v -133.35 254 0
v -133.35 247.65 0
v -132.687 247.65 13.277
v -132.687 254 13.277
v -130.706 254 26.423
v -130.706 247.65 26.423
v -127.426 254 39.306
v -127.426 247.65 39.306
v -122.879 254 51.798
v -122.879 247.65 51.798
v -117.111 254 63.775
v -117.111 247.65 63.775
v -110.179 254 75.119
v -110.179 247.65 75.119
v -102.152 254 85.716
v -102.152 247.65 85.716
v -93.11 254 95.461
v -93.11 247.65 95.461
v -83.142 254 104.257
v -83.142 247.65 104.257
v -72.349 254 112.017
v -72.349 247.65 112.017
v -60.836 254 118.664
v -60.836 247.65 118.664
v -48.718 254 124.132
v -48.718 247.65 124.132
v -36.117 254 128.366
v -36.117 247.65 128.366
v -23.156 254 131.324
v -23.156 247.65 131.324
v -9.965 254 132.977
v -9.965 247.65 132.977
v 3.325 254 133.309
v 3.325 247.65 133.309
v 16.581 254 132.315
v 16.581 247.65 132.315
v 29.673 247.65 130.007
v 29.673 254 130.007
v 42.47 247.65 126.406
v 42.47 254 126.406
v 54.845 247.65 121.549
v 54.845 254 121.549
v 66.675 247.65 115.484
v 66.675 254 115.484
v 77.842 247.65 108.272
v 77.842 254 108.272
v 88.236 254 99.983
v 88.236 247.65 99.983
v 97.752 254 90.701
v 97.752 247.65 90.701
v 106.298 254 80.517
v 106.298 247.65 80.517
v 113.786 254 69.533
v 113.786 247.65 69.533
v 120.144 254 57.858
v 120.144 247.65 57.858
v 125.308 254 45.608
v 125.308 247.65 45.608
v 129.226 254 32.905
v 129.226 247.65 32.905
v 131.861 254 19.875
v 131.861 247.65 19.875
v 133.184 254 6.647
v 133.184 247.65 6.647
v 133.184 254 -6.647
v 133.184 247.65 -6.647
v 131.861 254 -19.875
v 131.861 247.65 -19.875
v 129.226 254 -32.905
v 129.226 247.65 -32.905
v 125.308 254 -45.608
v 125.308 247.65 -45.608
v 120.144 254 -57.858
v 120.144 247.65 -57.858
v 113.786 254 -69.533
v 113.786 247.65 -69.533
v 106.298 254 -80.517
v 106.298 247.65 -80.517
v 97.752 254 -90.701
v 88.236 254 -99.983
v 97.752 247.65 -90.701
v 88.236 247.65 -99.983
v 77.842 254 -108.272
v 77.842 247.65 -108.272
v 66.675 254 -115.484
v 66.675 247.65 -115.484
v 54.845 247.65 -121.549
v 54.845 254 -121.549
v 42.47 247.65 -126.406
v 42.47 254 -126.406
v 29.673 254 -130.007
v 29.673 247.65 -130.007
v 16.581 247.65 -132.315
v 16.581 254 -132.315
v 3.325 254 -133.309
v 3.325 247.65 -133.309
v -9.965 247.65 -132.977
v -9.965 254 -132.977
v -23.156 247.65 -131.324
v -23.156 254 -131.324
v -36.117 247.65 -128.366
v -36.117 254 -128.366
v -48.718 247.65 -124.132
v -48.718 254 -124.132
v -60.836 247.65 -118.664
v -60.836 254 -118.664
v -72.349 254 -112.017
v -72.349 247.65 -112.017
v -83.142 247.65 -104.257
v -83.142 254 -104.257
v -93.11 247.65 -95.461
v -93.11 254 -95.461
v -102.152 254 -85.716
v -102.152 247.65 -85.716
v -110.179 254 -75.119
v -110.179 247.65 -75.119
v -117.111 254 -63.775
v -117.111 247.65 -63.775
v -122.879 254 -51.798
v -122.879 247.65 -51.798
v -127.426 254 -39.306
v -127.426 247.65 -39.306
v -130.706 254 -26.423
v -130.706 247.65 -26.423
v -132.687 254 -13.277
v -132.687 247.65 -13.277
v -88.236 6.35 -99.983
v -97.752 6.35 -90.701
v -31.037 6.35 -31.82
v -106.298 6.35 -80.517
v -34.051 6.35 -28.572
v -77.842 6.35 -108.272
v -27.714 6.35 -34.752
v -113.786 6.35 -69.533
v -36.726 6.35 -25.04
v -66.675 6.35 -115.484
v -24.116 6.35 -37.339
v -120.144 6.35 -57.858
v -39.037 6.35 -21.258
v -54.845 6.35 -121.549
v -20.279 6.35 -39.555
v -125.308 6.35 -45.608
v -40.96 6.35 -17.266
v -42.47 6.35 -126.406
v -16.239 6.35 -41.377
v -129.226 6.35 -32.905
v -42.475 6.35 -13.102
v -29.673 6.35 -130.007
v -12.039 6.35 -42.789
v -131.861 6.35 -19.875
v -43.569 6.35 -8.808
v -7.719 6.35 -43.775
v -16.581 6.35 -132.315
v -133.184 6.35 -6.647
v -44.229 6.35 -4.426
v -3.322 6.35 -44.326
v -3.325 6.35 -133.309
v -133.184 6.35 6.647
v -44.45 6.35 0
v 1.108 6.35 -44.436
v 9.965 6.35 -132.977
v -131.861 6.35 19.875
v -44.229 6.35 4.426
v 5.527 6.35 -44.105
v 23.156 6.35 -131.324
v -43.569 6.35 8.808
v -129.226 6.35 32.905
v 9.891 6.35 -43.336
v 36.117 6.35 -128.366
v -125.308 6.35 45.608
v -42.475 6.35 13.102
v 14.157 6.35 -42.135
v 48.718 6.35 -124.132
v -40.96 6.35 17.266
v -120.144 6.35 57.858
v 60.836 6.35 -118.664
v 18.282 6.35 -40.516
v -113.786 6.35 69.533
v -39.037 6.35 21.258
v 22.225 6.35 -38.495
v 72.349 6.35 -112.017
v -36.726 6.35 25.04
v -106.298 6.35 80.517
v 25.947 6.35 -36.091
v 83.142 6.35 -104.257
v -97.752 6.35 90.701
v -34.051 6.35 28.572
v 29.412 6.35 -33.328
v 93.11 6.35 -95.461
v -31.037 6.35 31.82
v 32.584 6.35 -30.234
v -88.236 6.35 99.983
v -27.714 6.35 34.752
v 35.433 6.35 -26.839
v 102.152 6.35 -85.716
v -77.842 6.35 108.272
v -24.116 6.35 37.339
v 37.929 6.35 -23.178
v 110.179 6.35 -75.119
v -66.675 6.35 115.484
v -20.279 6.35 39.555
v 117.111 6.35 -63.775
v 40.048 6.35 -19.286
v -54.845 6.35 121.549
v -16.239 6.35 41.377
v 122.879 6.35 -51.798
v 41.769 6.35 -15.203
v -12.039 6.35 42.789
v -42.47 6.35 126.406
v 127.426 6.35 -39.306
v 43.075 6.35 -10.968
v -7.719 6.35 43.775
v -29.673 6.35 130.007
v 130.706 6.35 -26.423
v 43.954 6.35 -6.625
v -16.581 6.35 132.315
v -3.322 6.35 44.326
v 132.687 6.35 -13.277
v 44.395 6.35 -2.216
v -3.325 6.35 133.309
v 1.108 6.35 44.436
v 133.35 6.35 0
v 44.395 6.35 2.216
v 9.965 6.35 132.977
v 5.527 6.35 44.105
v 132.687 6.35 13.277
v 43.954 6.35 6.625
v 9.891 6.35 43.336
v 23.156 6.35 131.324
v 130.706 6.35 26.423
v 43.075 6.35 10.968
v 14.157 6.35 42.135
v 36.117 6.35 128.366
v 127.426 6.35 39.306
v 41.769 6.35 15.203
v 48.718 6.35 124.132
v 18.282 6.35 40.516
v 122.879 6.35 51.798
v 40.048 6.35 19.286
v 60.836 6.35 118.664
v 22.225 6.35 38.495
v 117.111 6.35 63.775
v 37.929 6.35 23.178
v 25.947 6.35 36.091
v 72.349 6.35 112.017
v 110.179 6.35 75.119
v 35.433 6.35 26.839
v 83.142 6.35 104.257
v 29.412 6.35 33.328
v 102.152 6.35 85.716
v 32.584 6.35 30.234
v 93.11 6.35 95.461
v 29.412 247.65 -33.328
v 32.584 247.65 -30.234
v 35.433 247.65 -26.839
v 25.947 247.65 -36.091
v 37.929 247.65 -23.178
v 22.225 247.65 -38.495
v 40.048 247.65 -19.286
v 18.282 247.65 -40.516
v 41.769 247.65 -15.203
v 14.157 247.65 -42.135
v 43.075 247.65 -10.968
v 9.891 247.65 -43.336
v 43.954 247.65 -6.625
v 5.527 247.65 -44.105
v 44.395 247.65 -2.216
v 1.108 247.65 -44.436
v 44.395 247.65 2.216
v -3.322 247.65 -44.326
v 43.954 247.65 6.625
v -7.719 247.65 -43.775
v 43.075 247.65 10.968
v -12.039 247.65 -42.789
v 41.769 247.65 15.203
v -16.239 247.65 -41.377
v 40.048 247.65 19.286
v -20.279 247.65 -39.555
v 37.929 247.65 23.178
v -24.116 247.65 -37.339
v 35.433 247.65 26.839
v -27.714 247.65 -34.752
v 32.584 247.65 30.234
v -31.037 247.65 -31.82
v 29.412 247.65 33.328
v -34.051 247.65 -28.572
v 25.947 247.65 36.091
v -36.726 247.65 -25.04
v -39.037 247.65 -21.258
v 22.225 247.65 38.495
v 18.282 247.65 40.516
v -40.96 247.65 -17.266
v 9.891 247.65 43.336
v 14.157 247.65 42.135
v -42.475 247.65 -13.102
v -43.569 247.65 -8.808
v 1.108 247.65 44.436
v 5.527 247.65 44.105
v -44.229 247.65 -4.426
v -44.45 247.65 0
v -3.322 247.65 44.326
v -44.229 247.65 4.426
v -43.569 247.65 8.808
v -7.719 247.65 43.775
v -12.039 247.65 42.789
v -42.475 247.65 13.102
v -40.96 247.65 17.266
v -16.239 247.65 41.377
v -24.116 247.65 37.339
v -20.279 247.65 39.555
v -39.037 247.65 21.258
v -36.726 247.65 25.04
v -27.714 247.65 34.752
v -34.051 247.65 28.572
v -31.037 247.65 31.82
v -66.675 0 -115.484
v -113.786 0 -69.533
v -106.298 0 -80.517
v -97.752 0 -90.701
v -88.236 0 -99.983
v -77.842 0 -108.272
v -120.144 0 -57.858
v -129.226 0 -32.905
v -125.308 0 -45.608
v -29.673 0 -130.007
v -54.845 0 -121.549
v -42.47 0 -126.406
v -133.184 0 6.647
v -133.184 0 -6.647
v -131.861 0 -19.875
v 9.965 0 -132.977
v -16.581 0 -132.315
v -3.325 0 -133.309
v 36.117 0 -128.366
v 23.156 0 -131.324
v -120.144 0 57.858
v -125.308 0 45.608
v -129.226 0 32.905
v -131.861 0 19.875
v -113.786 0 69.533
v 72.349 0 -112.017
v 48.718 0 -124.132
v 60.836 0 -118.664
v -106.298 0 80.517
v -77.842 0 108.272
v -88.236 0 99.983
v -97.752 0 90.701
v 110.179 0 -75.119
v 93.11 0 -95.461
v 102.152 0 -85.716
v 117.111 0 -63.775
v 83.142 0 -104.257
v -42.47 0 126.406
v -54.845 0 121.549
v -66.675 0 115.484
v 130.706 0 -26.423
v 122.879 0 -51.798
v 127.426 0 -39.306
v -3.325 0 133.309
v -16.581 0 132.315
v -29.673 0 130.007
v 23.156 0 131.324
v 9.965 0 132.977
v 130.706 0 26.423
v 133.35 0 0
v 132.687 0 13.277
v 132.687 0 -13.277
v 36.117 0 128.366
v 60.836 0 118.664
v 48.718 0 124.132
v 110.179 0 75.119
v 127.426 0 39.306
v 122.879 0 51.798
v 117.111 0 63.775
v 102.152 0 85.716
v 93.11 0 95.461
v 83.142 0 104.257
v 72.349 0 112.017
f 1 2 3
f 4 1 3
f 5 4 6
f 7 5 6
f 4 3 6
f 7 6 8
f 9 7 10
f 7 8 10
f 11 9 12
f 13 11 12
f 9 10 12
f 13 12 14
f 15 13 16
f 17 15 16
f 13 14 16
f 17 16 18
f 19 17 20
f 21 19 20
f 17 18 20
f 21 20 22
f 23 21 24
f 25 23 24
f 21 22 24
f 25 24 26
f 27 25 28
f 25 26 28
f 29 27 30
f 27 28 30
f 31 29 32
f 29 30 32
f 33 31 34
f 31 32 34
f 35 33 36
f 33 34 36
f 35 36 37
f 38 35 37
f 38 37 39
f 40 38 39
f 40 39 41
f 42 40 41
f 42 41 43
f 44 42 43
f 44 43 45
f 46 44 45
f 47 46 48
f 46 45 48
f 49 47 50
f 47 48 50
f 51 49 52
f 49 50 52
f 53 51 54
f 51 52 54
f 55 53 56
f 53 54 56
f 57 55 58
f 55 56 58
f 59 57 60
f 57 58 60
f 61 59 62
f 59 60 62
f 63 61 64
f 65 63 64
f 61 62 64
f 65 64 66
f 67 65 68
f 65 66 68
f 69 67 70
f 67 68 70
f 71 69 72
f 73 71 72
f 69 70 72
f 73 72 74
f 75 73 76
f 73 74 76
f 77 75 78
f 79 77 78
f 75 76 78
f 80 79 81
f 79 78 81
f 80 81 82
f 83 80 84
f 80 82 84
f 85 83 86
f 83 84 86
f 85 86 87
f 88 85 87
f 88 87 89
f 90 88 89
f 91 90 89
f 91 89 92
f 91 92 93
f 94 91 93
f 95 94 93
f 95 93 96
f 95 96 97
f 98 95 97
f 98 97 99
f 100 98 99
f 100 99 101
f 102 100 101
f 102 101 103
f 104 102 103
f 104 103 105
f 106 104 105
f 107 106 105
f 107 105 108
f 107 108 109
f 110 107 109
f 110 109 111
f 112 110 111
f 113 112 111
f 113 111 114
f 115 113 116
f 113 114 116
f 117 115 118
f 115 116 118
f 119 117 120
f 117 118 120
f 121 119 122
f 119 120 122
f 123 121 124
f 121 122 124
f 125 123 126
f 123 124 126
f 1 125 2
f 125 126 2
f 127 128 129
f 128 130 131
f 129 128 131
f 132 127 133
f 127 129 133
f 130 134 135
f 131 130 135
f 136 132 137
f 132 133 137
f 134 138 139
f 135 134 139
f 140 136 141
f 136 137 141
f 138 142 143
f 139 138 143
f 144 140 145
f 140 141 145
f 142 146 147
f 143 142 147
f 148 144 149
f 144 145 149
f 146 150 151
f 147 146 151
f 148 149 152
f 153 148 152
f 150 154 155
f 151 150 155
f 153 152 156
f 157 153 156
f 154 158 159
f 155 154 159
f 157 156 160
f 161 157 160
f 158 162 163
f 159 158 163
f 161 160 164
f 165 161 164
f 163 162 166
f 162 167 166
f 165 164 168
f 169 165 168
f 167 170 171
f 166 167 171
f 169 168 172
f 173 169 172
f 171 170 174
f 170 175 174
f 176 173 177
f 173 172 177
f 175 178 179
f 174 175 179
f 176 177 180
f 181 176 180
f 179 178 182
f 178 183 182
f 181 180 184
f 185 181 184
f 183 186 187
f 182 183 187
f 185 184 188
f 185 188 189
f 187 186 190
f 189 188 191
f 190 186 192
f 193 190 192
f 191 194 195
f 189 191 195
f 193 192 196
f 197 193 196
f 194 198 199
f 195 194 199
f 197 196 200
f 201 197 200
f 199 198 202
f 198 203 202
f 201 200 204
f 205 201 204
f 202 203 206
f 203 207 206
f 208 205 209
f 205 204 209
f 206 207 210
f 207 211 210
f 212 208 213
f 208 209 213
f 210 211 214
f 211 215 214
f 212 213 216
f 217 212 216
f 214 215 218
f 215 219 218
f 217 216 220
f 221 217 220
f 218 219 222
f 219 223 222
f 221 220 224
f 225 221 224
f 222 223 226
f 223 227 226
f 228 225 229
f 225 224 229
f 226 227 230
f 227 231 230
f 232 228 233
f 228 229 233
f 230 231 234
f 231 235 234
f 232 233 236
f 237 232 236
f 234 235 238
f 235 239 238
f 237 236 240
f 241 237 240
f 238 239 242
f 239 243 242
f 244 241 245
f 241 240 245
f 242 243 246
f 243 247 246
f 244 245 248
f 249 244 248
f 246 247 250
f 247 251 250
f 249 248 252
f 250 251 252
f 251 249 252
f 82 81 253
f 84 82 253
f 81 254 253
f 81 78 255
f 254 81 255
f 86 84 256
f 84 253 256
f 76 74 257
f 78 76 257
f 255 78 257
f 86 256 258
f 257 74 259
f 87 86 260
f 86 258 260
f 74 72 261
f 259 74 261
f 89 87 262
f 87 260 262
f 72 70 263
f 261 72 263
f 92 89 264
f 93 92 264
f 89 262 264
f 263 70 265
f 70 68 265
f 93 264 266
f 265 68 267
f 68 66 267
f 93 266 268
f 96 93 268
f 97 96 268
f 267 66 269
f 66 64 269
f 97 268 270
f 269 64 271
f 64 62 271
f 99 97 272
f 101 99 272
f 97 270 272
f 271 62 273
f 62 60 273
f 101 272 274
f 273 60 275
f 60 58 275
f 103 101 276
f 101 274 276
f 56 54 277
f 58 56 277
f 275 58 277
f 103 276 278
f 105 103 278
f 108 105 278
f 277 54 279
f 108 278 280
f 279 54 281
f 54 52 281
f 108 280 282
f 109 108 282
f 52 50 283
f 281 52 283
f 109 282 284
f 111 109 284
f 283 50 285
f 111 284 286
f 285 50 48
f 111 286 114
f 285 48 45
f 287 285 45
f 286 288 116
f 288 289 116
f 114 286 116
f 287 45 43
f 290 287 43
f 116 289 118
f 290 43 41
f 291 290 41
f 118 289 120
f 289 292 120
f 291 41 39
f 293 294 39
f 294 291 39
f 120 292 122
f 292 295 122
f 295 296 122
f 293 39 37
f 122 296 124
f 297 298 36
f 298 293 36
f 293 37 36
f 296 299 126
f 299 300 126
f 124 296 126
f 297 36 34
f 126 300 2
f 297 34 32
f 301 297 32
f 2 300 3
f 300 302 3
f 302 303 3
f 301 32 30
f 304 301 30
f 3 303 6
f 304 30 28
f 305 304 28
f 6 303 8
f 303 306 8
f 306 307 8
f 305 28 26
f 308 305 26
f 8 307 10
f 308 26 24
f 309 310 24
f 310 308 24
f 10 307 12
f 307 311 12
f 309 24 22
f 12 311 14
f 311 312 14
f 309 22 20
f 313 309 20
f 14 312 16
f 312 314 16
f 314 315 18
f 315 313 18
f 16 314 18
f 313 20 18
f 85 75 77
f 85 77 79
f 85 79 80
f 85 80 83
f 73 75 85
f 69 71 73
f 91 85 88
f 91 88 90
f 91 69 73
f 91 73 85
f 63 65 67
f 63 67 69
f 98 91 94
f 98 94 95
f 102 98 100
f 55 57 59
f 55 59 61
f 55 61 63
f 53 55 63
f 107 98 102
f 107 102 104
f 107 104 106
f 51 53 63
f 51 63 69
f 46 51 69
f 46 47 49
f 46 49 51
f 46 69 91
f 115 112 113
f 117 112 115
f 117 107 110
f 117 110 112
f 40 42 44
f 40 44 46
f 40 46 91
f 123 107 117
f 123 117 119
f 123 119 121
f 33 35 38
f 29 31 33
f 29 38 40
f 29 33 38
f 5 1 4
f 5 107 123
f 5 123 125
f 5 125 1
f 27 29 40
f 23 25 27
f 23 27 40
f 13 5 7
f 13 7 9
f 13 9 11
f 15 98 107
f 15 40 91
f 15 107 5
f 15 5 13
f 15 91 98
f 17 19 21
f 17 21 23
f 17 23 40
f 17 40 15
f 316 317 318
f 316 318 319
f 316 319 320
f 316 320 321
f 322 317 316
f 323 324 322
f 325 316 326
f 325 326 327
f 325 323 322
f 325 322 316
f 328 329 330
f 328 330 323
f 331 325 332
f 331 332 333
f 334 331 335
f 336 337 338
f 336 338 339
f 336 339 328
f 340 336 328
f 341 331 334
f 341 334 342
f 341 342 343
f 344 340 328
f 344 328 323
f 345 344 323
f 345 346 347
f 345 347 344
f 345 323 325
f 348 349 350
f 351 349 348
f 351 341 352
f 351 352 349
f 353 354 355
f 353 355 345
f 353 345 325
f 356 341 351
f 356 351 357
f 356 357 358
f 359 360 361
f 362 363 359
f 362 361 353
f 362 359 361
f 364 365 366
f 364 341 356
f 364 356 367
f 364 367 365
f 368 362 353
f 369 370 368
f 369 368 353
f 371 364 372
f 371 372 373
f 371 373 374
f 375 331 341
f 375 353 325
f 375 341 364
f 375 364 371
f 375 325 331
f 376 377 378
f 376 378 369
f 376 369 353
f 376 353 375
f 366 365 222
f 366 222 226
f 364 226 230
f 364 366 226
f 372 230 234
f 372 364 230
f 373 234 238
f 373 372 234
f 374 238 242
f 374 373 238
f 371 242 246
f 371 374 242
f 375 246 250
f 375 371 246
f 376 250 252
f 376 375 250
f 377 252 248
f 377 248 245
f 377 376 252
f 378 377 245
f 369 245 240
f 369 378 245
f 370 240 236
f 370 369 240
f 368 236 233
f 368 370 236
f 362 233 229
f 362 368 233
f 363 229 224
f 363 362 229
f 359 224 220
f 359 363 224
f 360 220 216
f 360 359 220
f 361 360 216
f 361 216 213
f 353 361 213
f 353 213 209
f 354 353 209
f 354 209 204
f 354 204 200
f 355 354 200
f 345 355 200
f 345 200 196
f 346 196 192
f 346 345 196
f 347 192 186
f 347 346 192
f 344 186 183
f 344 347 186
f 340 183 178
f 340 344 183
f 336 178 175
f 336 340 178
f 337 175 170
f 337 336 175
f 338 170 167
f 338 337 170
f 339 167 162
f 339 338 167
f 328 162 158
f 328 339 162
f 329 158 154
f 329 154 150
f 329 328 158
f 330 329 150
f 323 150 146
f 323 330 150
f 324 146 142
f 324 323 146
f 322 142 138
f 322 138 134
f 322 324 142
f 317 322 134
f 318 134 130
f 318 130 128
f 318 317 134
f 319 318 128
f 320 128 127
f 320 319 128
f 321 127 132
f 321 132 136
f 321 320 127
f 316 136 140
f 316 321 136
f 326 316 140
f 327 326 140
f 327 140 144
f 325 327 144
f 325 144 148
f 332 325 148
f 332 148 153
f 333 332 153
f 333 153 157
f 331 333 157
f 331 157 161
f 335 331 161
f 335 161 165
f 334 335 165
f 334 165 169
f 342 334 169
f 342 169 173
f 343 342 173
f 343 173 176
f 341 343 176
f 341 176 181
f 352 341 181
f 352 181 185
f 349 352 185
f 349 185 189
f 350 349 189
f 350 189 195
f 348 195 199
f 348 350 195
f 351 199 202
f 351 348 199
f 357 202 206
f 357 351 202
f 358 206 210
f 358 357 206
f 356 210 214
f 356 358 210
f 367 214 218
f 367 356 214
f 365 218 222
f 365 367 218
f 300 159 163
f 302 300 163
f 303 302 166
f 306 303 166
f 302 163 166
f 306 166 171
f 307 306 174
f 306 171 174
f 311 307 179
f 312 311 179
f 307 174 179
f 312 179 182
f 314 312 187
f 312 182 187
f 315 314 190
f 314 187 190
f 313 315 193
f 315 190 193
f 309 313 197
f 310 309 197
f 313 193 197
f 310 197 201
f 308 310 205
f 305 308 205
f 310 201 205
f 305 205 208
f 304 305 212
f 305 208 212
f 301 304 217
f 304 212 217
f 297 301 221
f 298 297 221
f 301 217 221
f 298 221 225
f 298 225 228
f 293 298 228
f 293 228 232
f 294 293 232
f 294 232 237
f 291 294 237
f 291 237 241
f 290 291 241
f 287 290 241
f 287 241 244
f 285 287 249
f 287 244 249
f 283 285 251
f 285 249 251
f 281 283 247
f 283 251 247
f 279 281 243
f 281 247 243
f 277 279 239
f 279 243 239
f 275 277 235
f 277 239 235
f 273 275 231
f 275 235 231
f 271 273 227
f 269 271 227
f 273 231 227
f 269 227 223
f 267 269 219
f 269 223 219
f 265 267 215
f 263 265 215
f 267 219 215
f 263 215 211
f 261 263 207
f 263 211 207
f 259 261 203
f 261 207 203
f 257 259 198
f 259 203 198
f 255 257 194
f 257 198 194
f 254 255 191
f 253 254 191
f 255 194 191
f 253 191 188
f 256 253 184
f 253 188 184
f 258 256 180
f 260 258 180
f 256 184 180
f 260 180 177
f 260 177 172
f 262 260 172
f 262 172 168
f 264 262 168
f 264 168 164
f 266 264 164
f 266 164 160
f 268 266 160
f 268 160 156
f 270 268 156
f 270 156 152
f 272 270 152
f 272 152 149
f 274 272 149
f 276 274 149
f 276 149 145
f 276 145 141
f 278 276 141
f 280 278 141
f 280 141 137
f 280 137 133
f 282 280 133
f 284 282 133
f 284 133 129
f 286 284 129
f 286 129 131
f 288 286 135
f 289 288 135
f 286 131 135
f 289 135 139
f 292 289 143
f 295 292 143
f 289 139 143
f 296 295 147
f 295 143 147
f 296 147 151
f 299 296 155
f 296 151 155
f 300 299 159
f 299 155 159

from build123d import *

# Parameters (mm, degrees)
F0_R     = 133.35
F1_DEPTH = 6.35
F2_R     = 44.45
F3_DEPTH = 241.3
F4_R     = 133.35
F4_R_2   = 44.45
F5_DEPTH = 6.35


with BuildPart() as f1:
    # F0 (on Front) → F1 (new body)
    with BuildSketch(Plane.XZ):
        Circle(F0_R)
    extrude(amount=-F1_DEPTH)

    # F2 (on face) → F3 (join)
    with BuildSketch(Plane(origin=(0, 6.35, 0), x_dir=(-1, 0, 0), z_dir=(0, 1, 0))):
        Circle(F2_R)
    extrude(amount=F3_DEPTH)

    # F4 (on face) → F5 (join)
    with BuildSketch(Plane(origin=(0, 247.65, 0), x_dir=(-1, 0, 0), z_dir=(0, 1, 0))):
        Circle(F4_R)
        Circle(F4_R_2, mode=Mode.SUBTRACT)
        Circle(F4_R_2)
    extrude(amount=F5_DEPTH)


solid = f1.part
